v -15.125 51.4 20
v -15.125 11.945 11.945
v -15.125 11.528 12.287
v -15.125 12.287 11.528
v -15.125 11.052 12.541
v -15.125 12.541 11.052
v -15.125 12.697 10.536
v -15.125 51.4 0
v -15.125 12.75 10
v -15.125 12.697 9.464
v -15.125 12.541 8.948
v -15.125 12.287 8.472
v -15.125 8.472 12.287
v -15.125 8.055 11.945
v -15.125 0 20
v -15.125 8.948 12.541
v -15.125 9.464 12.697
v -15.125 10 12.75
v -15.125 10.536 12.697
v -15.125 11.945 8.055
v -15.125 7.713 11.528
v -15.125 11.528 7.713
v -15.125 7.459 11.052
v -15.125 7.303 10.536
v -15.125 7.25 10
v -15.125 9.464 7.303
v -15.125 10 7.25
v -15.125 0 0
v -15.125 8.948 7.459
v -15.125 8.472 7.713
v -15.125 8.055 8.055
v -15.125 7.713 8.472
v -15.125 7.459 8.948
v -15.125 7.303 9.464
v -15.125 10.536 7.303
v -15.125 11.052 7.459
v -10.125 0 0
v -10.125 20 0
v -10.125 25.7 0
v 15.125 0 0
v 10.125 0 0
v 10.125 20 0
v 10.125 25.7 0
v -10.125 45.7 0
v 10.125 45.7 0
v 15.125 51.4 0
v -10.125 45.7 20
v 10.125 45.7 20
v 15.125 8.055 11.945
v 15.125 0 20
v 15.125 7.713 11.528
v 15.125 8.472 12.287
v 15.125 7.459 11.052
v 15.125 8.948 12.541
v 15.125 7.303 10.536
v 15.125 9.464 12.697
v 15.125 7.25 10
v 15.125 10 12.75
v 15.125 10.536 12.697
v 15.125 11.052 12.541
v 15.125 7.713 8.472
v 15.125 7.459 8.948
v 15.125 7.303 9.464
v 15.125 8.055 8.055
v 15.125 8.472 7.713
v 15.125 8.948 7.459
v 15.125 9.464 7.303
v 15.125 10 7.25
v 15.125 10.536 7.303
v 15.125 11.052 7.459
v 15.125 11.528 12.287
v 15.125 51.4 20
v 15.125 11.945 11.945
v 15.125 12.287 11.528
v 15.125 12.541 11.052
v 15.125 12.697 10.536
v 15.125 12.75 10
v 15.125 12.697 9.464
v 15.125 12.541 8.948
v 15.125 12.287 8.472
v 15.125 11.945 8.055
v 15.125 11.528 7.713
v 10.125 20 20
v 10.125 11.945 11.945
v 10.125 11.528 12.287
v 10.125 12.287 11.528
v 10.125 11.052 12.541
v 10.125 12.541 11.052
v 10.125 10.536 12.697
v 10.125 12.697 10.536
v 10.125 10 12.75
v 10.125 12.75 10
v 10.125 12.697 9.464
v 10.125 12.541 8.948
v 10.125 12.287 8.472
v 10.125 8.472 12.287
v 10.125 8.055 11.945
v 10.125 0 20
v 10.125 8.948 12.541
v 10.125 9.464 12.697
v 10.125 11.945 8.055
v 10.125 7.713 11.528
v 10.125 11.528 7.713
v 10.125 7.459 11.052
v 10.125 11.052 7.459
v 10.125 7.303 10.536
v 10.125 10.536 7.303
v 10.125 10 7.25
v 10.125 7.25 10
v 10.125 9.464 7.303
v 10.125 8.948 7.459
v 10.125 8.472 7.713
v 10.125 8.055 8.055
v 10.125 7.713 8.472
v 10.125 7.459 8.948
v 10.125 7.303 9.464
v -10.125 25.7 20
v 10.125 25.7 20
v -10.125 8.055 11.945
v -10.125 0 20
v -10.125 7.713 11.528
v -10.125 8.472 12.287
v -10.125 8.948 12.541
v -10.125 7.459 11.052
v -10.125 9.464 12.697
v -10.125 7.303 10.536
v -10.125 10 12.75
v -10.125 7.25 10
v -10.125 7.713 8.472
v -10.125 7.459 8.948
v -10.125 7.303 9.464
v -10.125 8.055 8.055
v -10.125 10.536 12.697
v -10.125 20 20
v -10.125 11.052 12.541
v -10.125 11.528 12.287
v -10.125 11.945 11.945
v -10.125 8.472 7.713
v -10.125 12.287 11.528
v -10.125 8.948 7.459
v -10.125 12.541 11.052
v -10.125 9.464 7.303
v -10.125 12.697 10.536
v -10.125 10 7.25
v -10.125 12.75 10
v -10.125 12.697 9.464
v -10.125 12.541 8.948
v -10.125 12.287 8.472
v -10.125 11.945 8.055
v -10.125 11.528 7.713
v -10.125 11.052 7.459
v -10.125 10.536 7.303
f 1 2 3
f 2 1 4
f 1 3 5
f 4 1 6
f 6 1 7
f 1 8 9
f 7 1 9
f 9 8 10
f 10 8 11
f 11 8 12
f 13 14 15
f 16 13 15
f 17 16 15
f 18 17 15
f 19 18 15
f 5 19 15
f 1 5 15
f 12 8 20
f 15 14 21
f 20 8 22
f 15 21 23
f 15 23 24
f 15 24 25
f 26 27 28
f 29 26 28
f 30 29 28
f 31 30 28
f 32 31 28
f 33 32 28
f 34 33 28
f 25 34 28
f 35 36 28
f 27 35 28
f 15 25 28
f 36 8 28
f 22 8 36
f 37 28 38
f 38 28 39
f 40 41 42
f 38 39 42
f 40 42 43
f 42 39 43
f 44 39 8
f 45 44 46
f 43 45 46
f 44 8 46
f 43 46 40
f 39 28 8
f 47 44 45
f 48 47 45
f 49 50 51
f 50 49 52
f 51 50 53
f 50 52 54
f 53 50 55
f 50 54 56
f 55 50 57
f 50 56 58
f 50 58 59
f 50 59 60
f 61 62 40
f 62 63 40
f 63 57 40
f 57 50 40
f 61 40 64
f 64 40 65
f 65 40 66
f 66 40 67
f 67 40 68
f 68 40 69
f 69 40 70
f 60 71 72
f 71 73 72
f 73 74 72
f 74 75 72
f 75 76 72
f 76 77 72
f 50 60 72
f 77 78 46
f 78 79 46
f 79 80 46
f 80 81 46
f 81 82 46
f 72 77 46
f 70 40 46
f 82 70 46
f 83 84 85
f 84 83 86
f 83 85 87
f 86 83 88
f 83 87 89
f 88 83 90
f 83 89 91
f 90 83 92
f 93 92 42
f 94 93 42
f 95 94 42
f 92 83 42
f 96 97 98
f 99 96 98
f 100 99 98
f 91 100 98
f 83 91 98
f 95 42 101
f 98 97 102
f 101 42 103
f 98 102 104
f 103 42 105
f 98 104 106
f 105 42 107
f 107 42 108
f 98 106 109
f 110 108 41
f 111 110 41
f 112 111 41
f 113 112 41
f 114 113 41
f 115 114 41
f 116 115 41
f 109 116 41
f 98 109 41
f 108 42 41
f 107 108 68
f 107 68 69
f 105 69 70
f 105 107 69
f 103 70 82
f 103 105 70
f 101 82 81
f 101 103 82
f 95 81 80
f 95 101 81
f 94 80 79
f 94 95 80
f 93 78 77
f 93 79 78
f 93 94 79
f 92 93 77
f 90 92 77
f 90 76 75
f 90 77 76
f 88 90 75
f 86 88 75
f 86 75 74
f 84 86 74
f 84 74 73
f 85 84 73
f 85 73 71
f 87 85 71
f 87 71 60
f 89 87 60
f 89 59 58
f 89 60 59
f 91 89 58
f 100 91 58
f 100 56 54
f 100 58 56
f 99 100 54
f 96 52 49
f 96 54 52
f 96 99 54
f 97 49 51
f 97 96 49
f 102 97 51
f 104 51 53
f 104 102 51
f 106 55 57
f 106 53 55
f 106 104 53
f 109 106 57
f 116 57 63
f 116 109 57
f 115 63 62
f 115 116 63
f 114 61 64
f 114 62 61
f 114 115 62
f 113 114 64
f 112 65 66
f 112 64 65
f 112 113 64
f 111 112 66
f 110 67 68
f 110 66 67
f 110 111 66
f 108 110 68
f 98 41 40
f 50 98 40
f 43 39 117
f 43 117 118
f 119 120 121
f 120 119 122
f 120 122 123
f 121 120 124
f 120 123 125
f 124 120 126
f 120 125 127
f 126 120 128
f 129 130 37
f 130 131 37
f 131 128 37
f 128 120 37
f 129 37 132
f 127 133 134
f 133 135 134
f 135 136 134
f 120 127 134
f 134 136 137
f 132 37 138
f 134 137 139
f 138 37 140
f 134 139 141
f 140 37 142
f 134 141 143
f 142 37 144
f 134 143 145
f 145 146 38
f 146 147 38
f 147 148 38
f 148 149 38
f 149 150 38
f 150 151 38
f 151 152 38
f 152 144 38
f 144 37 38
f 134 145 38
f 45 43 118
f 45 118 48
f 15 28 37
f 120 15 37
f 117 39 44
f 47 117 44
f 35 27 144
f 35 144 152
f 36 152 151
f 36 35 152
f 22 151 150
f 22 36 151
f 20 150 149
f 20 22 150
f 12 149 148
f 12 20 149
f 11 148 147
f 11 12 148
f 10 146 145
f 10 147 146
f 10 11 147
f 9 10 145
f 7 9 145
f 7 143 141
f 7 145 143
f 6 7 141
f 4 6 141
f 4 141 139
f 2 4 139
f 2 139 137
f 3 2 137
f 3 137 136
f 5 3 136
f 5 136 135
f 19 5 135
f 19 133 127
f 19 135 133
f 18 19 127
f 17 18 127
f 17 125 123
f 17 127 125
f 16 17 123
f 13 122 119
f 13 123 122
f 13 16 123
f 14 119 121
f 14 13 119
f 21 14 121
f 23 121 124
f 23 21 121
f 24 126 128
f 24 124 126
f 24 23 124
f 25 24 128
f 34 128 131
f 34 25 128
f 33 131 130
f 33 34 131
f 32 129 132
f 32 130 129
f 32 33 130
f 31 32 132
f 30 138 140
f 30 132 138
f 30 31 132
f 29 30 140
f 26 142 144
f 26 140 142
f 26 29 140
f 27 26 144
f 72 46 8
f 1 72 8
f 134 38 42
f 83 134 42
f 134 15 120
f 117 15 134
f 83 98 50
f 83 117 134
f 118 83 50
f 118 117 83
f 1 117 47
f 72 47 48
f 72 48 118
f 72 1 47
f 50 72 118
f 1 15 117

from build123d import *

# Parameters (mm, degrees)
SKETCH1_W               = 20.25
SKETCH1_H               = 20
BOSS_EXTRUDE1_DEPTH     = 20
CUT_EXTRUDE1_DEPTH      = 58.19025813
CUT_EXTRUDE1_DEPTH_BACK = 58.19025813
SKETCH2_R               = 2.75


with BuildPart() as part:
    # Sketch1 → Boss-Extrude1 (new body)
    with BuildSketch(Plane.XY):
        Polygon((-10.125, 0), (-10.125, 20), (10.125, 20), (10.125, 0), (15.125, 0), (15.125, 51.4), (-15.125, 51.4), (-15.125, 0), align=None)
        with Locations((0, 35.7)):
            Rectangle(SKETCH1_W, SKETCH1_H, mode=Mode.SUBTRACT)
    extrude(amount=BOSS_EXTRUDE1_DEPTH)

    # Sketch2 → Cut-Extrude1 (cut, two sides: drawn at the far end of the back side and taken through both)
    with BuildSketch(Plane(origin=(0, 0, 0), x_dir=(0, 0, -1), z_dir=(1, 0, 0)).offset(-CUT_EXTRUDE1_DEPTH_BACK)):
        with Locations((-10, 10)):
            Circle(SKETCH2_R)
    extrude(amount=CUT_EXTRUDE1_DEPTH + CUT_EXTRUDE1_DEPTH_BACK, mode=Mode.SUBTRACT)


solid = part.part
